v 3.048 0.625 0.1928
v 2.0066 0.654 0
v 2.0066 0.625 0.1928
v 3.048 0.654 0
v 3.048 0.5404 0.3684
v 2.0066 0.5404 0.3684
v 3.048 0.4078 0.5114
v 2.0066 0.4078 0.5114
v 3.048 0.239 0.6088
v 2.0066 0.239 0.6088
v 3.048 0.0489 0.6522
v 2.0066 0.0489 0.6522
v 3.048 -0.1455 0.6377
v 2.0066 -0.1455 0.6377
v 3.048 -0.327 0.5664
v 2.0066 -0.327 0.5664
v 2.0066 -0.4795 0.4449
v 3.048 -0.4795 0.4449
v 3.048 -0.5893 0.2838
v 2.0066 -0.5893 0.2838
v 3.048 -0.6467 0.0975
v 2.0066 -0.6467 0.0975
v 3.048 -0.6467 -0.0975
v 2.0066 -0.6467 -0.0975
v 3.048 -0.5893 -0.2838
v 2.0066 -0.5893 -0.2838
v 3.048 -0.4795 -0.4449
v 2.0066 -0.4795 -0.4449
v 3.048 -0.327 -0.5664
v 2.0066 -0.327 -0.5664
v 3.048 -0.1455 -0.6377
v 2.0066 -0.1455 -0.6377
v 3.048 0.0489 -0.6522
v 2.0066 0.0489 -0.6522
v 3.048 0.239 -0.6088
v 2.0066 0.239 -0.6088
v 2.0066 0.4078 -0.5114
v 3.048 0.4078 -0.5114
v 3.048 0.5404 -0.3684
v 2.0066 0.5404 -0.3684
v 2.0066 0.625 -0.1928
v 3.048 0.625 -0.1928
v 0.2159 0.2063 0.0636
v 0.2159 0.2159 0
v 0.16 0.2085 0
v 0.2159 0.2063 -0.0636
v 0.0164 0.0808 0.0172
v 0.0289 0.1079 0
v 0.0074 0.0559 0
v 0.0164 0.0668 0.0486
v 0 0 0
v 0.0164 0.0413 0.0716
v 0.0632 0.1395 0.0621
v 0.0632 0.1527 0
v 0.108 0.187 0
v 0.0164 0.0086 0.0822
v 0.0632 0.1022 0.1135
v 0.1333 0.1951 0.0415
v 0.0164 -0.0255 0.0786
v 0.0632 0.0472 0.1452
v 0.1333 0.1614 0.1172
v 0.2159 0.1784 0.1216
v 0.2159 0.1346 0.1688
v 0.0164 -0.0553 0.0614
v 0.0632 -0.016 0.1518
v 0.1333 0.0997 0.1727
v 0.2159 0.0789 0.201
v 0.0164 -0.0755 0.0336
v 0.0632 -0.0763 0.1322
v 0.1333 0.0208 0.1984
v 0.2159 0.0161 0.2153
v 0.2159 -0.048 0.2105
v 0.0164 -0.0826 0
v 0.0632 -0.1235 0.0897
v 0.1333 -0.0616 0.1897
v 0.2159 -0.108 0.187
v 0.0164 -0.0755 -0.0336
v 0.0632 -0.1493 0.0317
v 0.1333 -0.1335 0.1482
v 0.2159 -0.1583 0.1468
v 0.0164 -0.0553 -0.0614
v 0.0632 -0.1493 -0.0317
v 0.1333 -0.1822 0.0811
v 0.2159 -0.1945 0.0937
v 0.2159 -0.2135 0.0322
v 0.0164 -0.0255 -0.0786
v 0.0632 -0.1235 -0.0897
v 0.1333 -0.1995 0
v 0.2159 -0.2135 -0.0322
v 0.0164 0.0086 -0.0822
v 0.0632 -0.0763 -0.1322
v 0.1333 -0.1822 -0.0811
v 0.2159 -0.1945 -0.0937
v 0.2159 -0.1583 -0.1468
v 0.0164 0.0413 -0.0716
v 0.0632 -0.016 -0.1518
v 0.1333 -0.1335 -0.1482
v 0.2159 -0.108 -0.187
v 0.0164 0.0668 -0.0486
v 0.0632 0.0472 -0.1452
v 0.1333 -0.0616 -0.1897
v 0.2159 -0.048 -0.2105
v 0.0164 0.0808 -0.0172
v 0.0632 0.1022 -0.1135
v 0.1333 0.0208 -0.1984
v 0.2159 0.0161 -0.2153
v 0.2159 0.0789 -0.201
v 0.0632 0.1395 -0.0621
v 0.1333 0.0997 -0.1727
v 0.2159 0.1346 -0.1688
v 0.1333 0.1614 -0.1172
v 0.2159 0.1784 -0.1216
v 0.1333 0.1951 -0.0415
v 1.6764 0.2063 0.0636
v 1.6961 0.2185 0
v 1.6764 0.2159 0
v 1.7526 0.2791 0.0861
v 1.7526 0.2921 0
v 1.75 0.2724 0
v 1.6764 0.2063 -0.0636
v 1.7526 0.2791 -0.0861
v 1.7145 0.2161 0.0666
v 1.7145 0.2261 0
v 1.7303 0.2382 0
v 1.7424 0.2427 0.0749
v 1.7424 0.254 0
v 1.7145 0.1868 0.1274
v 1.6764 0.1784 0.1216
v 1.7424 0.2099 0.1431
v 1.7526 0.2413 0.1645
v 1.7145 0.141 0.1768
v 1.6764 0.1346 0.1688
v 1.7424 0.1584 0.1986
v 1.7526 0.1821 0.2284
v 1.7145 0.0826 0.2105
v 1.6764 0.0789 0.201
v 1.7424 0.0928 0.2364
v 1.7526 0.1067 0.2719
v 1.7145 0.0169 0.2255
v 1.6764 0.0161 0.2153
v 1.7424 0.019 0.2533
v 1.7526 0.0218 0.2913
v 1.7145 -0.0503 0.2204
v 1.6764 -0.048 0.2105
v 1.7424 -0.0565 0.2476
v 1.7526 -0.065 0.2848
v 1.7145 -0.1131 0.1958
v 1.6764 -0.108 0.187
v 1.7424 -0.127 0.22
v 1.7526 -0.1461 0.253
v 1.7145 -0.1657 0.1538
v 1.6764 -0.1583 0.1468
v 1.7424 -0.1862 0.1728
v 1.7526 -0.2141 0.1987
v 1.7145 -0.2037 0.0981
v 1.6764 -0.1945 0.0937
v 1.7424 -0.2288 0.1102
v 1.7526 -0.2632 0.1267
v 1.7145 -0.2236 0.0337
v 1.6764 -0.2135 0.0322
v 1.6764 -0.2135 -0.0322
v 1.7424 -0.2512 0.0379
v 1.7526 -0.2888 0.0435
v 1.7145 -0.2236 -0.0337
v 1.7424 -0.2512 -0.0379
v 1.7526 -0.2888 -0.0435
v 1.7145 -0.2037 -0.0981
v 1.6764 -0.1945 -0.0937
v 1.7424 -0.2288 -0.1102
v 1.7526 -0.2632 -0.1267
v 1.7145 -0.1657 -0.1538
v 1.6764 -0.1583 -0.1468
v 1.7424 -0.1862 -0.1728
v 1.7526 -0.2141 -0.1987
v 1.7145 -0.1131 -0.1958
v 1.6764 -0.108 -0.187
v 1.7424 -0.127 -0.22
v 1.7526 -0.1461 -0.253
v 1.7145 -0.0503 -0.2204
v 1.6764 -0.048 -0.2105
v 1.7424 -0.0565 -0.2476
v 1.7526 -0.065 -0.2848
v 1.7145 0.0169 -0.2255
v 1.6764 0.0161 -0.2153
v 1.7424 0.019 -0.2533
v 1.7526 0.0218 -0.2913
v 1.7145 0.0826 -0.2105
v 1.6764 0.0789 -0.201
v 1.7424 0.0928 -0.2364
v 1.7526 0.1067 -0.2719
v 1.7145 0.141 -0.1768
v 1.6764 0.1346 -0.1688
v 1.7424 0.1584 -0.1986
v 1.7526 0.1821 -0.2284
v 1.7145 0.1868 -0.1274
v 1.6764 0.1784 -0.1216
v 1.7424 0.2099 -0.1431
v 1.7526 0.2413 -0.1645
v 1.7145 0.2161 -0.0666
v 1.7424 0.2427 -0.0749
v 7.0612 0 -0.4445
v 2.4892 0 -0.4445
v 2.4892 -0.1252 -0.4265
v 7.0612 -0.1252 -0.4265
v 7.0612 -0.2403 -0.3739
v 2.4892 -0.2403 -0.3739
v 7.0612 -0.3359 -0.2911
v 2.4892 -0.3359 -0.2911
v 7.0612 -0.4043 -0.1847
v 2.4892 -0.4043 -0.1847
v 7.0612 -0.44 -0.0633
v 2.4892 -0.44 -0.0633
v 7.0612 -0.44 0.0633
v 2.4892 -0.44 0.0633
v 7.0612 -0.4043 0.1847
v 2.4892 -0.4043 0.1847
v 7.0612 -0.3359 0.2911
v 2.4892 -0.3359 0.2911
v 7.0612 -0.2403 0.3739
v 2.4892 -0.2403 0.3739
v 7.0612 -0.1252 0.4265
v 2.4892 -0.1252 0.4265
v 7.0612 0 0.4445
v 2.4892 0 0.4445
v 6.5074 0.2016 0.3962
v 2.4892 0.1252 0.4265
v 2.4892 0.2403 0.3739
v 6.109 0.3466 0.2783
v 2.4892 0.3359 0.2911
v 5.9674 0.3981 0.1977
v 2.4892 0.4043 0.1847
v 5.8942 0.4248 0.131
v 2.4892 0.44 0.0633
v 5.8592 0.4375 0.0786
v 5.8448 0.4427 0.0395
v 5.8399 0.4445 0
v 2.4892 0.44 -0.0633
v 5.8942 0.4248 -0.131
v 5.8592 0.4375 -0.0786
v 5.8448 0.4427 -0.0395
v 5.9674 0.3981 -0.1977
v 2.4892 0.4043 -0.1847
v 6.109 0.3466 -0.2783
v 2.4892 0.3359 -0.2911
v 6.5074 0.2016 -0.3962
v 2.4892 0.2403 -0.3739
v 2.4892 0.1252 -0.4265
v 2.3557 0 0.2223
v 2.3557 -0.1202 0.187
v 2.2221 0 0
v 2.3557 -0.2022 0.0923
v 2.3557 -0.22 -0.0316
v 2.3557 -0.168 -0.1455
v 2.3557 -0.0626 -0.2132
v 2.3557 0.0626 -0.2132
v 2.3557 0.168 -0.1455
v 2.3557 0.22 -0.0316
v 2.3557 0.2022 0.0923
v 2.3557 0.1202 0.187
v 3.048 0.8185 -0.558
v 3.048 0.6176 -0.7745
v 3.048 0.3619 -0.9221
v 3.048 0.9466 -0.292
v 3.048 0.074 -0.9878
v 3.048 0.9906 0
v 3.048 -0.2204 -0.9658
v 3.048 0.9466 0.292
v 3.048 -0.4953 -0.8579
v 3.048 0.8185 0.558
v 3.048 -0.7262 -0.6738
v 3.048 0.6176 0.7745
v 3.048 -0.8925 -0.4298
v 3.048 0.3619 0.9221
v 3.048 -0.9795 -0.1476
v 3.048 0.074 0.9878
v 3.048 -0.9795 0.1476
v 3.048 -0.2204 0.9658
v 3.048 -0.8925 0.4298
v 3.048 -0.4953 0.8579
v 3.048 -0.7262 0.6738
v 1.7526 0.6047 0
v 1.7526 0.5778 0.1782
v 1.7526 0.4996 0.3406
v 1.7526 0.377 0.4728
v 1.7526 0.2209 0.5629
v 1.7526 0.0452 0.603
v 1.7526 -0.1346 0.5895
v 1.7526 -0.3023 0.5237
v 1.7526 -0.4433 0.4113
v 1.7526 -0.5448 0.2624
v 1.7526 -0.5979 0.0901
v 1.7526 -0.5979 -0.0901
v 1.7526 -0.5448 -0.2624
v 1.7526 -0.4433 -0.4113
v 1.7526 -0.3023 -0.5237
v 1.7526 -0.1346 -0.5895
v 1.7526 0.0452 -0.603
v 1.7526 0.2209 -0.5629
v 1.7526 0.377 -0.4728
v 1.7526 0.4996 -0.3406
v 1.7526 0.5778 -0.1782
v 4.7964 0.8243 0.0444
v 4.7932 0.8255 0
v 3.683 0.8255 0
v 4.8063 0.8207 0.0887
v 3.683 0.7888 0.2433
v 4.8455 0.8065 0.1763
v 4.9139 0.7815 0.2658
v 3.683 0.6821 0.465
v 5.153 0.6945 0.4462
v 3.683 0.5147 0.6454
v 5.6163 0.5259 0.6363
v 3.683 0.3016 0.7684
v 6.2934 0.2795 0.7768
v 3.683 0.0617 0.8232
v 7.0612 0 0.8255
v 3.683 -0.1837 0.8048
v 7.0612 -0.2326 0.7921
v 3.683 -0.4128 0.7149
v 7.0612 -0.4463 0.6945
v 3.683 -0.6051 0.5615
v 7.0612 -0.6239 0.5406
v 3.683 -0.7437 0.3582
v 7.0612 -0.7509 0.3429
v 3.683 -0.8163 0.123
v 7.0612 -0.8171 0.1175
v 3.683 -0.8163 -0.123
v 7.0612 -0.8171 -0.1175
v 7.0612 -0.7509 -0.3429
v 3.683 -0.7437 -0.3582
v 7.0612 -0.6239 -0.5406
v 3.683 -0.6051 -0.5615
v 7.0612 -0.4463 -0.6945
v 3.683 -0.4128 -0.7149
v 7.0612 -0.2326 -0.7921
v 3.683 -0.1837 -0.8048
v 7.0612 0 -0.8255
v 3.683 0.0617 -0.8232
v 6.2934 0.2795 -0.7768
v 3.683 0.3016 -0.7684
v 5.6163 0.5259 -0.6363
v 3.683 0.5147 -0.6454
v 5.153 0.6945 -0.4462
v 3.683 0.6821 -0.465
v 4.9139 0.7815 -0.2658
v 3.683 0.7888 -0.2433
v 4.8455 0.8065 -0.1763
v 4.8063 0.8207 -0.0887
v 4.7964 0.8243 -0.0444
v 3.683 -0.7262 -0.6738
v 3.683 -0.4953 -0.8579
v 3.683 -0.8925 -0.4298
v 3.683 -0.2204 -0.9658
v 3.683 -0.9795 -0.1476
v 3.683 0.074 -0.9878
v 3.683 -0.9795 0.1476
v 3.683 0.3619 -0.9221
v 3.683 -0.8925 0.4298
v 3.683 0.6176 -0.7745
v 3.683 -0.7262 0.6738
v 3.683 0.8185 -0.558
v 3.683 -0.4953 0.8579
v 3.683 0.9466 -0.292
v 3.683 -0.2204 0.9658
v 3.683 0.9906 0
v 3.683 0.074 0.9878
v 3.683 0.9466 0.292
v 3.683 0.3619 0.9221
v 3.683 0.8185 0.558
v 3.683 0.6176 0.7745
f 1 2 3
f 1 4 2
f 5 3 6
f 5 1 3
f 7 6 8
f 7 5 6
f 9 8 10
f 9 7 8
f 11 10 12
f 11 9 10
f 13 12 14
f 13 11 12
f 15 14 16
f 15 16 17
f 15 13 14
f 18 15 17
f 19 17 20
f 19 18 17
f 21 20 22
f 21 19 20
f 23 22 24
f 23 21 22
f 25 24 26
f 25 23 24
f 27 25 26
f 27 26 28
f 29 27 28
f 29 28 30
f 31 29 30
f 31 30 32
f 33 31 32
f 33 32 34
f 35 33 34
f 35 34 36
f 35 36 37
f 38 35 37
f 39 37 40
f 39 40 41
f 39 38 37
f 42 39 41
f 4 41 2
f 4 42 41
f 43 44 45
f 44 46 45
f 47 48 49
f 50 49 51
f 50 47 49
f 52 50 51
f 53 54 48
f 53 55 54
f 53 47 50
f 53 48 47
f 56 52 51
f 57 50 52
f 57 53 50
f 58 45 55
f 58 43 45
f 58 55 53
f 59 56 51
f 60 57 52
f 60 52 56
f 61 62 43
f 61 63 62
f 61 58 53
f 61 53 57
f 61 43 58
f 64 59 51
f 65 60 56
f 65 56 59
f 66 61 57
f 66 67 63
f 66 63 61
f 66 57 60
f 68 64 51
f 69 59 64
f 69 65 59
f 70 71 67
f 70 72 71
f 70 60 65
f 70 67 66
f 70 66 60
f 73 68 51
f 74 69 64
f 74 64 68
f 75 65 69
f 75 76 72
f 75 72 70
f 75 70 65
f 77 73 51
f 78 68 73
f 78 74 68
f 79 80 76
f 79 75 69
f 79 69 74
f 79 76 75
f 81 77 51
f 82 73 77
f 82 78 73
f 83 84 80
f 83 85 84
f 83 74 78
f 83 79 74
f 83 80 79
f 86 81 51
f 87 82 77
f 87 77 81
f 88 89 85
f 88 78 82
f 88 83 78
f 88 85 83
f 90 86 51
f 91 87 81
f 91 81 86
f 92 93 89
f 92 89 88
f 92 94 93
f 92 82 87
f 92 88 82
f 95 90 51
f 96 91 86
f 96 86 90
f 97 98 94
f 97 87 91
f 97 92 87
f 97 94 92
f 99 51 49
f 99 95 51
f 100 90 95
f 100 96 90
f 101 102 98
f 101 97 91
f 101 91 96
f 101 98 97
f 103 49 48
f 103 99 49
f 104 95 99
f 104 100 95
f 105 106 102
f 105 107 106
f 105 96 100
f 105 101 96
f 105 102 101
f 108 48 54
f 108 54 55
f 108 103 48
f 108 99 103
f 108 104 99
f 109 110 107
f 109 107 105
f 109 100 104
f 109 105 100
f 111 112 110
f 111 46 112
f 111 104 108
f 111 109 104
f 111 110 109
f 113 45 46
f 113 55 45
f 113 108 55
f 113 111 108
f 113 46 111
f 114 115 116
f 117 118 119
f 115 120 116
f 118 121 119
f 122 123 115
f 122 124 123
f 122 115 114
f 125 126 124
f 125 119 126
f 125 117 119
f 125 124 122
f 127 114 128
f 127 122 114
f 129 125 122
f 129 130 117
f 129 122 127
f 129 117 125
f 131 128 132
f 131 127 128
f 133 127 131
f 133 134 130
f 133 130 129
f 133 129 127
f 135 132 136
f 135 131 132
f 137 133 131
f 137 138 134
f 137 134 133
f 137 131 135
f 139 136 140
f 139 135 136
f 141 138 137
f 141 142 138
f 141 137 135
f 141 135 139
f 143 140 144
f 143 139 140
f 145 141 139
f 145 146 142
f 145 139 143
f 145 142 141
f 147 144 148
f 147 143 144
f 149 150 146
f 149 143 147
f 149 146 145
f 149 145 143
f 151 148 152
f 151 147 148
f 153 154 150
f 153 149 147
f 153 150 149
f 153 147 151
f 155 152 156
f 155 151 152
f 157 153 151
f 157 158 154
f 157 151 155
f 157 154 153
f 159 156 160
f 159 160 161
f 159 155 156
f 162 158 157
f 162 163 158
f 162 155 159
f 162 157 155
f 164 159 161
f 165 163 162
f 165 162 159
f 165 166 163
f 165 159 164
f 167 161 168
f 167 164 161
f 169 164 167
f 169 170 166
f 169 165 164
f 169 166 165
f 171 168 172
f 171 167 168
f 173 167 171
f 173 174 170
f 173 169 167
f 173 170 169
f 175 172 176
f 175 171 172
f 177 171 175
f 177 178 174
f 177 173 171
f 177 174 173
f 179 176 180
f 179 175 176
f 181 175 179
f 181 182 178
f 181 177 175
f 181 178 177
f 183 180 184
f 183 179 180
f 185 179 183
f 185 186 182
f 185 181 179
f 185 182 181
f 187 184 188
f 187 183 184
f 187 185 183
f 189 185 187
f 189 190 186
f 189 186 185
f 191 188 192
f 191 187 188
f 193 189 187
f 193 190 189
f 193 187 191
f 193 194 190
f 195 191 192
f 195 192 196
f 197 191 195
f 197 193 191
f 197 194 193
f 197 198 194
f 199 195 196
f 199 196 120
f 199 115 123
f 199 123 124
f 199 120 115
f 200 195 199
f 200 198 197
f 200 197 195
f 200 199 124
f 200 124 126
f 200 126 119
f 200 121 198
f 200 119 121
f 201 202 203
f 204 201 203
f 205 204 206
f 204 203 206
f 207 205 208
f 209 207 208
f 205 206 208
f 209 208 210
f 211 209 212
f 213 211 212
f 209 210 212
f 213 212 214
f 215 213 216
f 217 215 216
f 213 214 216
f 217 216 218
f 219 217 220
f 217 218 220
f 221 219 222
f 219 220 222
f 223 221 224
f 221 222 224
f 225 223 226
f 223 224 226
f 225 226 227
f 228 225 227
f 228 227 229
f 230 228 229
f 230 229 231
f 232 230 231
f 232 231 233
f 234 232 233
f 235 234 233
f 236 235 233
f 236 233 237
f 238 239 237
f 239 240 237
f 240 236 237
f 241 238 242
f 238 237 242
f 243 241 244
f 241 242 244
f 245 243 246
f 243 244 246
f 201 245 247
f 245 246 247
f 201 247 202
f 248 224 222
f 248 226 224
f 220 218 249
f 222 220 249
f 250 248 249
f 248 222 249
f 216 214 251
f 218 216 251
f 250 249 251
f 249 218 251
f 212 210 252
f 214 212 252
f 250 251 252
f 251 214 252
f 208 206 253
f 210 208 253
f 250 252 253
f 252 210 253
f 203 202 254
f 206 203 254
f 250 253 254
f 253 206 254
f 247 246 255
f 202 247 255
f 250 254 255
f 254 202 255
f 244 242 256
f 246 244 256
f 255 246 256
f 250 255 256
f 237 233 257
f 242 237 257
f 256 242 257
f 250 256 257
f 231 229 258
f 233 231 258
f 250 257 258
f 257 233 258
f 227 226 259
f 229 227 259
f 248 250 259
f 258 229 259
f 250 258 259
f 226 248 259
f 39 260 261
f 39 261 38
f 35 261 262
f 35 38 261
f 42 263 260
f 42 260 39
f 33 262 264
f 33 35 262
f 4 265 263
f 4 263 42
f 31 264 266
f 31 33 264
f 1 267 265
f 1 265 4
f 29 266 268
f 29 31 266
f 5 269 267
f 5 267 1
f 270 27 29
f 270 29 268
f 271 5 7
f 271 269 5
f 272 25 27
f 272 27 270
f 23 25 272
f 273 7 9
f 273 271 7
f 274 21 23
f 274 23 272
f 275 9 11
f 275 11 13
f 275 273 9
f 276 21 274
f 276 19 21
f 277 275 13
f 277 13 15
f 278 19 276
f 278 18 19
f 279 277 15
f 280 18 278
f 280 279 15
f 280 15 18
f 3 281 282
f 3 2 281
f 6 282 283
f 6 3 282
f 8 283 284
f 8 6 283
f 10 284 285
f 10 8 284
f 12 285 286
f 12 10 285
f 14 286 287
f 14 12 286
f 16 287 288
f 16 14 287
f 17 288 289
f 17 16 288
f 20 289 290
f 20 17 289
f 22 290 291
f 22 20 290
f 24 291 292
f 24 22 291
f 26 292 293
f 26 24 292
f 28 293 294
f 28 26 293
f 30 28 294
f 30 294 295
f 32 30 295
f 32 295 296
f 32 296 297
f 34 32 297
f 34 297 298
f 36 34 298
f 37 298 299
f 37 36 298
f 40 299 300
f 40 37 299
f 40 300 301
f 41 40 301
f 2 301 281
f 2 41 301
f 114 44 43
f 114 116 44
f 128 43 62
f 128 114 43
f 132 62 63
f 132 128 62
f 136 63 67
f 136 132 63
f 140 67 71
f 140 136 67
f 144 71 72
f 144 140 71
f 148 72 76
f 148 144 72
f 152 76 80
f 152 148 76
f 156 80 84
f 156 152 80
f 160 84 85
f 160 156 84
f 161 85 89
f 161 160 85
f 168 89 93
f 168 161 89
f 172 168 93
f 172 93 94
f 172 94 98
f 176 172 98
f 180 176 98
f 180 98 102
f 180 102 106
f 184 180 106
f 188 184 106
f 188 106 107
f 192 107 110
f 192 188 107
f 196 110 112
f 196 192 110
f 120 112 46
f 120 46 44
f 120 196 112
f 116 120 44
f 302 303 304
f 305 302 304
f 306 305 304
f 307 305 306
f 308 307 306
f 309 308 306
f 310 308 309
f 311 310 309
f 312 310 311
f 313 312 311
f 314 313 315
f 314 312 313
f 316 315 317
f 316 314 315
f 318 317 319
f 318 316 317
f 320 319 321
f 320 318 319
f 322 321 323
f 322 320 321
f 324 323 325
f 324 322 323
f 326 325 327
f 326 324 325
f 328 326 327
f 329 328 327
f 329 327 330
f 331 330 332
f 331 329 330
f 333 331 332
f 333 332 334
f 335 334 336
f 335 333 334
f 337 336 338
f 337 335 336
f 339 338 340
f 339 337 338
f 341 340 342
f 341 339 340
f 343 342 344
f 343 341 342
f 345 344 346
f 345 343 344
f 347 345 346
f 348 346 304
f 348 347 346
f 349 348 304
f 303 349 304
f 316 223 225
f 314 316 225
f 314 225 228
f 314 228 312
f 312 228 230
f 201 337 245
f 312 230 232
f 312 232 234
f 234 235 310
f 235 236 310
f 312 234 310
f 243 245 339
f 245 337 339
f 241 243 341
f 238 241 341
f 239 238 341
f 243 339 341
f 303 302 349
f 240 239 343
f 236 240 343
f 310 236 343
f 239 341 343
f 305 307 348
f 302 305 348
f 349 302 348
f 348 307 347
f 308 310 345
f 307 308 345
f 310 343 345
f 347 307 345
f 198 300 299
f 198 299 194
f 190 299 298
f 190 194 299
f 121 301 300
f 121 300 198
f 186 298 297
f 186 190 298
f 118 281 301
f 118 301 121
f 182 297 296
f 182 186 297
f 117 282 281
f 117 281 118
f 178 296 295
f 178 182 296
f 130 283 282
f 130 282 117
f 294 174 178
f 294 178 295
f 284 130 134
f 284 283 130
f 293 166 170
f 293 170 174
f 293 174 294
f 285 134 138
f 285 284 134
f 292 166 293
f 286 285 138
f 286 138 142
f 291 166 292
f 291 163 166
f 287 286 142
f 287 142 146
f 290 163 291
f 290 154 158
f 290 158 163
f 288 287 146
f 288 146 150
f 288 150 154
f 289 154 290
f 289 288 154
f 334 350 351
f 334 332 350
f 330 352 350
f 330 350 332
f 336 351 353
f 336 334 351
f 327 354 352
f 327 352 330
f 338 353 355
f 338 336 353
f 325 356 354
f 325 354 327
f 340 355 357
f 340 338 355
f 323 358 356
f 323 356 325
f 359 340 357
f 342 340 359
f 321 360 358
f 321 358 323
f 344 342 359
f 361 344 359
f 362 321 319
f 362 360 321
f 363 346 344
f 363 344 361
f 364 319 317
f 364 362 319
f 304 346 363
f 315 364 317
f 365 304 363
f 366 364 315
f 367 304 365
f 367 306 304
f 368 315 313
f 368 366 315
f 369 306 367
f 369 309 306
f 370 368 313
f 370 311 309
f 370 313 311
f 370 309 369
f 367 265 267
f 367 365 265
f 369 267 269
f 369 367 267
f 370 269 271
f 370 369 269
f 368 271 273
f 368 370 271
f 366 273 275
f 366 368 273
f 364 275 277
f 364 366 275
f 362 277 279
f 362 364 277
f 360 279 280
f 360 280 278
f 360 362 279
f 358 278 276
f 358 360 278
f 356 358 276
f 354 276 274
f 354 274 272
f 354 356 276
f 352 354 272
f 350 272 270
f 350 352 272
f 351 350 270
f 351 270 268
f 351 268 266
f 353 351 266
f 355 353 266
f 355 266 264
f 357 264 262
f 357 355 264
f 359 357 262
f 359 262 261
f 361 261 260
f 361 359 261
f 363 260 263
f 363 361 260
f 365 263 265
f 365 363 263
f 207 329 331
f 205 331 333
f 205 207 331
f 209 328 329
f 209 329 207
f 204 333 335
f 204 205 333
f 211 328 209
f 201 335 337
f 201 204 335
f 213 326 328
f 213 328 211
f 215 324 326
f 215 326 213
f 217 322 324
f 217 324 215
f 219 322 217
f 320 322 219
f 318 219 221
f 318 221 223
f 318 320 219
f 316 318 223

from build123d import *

# Parameters (mm, degrees)
HOLE1_D                 = 0.889
HOLE1_DEPTH             = 4.572
HOLE1_TIP               = 0.267082545
CUT_EXTRUDE1_DEPTH      = 0.889
CUT_EXTRUDE1_DEPTH_BACK = 0.889


with BuildPart() as part:
    # Sketch1 → RevolutionAngle1 (revolve)
    with BuildSketch(Plane.XY):
        with BuildLine():
            Line((0.2159, 0.2159), (1.6764, 0.2159))
            ThreePointArc((1.6764, 0.2159), (1.730281537, 0.238218463), (1.7526, 0.2921))
            Line((1.7526, 0.2921), (1.7526, 0.604677401))
            Line((1.7526, 0.604677401), (2.0066, 0.65405))
            Line((2.0066, 0.65405), (3.048, 0.65405))
            Line((3.048, 0.65405), (3.048, 0.9906))
            Line((3.048, 0.9906), (3.683, 0.9906))
            Line((3.683, 0.9906), (3.683, 0.8255))
            Line((3.683, 0.8255), (7.0612, 0.8255))
            Line((7.0612, 0.8255), (7.0612, 0))
            Line((7.0612, 0), (0, 0))
            ThreePointArc((0, 0), (0.063235646, 0.152664354), (0.2159, 0.2159))
        make_face()
    revolve(axis=Axis((0, 0, 0), (1, 0, 0)))

    # Hole1
    with Locations(Plane(origin=(7.0612, 0, 0), x_dir=(0, 0, 1), z_dir=(1, 0, 0))):
        with Locations((0, 0)):
            Hole(HOLE1_D / 2, depth=HOLE1_DEPTH)
            with Locations((0, 0, -(HOLE1_DEPTH + HOLE1_TIP / 2))):  # 118° drill point
                Cone(0, HOLE1_D / 2, HOLE1_TIP, mode=Mode.SUBTRACT)

    # Sketch3 → Cut-Extrude1 (cut, two sides: drawn at the far end of the back side and taken through both)
    with BuildSketch(Plane.XY.offset(-CUT_EXTRUDE1_DEPTH_BACK)):
        Polygon((7.0612, 0.8255), (7.0612, 0), (4.79315739, 0.8255), align=None)
    extrude(amount=CUT_EXTRUDE1_DEPTH + CUT_EXTRUDE1_DEPTH_BACK, mode=Mode.SUBTRACT)


solid = part.part
